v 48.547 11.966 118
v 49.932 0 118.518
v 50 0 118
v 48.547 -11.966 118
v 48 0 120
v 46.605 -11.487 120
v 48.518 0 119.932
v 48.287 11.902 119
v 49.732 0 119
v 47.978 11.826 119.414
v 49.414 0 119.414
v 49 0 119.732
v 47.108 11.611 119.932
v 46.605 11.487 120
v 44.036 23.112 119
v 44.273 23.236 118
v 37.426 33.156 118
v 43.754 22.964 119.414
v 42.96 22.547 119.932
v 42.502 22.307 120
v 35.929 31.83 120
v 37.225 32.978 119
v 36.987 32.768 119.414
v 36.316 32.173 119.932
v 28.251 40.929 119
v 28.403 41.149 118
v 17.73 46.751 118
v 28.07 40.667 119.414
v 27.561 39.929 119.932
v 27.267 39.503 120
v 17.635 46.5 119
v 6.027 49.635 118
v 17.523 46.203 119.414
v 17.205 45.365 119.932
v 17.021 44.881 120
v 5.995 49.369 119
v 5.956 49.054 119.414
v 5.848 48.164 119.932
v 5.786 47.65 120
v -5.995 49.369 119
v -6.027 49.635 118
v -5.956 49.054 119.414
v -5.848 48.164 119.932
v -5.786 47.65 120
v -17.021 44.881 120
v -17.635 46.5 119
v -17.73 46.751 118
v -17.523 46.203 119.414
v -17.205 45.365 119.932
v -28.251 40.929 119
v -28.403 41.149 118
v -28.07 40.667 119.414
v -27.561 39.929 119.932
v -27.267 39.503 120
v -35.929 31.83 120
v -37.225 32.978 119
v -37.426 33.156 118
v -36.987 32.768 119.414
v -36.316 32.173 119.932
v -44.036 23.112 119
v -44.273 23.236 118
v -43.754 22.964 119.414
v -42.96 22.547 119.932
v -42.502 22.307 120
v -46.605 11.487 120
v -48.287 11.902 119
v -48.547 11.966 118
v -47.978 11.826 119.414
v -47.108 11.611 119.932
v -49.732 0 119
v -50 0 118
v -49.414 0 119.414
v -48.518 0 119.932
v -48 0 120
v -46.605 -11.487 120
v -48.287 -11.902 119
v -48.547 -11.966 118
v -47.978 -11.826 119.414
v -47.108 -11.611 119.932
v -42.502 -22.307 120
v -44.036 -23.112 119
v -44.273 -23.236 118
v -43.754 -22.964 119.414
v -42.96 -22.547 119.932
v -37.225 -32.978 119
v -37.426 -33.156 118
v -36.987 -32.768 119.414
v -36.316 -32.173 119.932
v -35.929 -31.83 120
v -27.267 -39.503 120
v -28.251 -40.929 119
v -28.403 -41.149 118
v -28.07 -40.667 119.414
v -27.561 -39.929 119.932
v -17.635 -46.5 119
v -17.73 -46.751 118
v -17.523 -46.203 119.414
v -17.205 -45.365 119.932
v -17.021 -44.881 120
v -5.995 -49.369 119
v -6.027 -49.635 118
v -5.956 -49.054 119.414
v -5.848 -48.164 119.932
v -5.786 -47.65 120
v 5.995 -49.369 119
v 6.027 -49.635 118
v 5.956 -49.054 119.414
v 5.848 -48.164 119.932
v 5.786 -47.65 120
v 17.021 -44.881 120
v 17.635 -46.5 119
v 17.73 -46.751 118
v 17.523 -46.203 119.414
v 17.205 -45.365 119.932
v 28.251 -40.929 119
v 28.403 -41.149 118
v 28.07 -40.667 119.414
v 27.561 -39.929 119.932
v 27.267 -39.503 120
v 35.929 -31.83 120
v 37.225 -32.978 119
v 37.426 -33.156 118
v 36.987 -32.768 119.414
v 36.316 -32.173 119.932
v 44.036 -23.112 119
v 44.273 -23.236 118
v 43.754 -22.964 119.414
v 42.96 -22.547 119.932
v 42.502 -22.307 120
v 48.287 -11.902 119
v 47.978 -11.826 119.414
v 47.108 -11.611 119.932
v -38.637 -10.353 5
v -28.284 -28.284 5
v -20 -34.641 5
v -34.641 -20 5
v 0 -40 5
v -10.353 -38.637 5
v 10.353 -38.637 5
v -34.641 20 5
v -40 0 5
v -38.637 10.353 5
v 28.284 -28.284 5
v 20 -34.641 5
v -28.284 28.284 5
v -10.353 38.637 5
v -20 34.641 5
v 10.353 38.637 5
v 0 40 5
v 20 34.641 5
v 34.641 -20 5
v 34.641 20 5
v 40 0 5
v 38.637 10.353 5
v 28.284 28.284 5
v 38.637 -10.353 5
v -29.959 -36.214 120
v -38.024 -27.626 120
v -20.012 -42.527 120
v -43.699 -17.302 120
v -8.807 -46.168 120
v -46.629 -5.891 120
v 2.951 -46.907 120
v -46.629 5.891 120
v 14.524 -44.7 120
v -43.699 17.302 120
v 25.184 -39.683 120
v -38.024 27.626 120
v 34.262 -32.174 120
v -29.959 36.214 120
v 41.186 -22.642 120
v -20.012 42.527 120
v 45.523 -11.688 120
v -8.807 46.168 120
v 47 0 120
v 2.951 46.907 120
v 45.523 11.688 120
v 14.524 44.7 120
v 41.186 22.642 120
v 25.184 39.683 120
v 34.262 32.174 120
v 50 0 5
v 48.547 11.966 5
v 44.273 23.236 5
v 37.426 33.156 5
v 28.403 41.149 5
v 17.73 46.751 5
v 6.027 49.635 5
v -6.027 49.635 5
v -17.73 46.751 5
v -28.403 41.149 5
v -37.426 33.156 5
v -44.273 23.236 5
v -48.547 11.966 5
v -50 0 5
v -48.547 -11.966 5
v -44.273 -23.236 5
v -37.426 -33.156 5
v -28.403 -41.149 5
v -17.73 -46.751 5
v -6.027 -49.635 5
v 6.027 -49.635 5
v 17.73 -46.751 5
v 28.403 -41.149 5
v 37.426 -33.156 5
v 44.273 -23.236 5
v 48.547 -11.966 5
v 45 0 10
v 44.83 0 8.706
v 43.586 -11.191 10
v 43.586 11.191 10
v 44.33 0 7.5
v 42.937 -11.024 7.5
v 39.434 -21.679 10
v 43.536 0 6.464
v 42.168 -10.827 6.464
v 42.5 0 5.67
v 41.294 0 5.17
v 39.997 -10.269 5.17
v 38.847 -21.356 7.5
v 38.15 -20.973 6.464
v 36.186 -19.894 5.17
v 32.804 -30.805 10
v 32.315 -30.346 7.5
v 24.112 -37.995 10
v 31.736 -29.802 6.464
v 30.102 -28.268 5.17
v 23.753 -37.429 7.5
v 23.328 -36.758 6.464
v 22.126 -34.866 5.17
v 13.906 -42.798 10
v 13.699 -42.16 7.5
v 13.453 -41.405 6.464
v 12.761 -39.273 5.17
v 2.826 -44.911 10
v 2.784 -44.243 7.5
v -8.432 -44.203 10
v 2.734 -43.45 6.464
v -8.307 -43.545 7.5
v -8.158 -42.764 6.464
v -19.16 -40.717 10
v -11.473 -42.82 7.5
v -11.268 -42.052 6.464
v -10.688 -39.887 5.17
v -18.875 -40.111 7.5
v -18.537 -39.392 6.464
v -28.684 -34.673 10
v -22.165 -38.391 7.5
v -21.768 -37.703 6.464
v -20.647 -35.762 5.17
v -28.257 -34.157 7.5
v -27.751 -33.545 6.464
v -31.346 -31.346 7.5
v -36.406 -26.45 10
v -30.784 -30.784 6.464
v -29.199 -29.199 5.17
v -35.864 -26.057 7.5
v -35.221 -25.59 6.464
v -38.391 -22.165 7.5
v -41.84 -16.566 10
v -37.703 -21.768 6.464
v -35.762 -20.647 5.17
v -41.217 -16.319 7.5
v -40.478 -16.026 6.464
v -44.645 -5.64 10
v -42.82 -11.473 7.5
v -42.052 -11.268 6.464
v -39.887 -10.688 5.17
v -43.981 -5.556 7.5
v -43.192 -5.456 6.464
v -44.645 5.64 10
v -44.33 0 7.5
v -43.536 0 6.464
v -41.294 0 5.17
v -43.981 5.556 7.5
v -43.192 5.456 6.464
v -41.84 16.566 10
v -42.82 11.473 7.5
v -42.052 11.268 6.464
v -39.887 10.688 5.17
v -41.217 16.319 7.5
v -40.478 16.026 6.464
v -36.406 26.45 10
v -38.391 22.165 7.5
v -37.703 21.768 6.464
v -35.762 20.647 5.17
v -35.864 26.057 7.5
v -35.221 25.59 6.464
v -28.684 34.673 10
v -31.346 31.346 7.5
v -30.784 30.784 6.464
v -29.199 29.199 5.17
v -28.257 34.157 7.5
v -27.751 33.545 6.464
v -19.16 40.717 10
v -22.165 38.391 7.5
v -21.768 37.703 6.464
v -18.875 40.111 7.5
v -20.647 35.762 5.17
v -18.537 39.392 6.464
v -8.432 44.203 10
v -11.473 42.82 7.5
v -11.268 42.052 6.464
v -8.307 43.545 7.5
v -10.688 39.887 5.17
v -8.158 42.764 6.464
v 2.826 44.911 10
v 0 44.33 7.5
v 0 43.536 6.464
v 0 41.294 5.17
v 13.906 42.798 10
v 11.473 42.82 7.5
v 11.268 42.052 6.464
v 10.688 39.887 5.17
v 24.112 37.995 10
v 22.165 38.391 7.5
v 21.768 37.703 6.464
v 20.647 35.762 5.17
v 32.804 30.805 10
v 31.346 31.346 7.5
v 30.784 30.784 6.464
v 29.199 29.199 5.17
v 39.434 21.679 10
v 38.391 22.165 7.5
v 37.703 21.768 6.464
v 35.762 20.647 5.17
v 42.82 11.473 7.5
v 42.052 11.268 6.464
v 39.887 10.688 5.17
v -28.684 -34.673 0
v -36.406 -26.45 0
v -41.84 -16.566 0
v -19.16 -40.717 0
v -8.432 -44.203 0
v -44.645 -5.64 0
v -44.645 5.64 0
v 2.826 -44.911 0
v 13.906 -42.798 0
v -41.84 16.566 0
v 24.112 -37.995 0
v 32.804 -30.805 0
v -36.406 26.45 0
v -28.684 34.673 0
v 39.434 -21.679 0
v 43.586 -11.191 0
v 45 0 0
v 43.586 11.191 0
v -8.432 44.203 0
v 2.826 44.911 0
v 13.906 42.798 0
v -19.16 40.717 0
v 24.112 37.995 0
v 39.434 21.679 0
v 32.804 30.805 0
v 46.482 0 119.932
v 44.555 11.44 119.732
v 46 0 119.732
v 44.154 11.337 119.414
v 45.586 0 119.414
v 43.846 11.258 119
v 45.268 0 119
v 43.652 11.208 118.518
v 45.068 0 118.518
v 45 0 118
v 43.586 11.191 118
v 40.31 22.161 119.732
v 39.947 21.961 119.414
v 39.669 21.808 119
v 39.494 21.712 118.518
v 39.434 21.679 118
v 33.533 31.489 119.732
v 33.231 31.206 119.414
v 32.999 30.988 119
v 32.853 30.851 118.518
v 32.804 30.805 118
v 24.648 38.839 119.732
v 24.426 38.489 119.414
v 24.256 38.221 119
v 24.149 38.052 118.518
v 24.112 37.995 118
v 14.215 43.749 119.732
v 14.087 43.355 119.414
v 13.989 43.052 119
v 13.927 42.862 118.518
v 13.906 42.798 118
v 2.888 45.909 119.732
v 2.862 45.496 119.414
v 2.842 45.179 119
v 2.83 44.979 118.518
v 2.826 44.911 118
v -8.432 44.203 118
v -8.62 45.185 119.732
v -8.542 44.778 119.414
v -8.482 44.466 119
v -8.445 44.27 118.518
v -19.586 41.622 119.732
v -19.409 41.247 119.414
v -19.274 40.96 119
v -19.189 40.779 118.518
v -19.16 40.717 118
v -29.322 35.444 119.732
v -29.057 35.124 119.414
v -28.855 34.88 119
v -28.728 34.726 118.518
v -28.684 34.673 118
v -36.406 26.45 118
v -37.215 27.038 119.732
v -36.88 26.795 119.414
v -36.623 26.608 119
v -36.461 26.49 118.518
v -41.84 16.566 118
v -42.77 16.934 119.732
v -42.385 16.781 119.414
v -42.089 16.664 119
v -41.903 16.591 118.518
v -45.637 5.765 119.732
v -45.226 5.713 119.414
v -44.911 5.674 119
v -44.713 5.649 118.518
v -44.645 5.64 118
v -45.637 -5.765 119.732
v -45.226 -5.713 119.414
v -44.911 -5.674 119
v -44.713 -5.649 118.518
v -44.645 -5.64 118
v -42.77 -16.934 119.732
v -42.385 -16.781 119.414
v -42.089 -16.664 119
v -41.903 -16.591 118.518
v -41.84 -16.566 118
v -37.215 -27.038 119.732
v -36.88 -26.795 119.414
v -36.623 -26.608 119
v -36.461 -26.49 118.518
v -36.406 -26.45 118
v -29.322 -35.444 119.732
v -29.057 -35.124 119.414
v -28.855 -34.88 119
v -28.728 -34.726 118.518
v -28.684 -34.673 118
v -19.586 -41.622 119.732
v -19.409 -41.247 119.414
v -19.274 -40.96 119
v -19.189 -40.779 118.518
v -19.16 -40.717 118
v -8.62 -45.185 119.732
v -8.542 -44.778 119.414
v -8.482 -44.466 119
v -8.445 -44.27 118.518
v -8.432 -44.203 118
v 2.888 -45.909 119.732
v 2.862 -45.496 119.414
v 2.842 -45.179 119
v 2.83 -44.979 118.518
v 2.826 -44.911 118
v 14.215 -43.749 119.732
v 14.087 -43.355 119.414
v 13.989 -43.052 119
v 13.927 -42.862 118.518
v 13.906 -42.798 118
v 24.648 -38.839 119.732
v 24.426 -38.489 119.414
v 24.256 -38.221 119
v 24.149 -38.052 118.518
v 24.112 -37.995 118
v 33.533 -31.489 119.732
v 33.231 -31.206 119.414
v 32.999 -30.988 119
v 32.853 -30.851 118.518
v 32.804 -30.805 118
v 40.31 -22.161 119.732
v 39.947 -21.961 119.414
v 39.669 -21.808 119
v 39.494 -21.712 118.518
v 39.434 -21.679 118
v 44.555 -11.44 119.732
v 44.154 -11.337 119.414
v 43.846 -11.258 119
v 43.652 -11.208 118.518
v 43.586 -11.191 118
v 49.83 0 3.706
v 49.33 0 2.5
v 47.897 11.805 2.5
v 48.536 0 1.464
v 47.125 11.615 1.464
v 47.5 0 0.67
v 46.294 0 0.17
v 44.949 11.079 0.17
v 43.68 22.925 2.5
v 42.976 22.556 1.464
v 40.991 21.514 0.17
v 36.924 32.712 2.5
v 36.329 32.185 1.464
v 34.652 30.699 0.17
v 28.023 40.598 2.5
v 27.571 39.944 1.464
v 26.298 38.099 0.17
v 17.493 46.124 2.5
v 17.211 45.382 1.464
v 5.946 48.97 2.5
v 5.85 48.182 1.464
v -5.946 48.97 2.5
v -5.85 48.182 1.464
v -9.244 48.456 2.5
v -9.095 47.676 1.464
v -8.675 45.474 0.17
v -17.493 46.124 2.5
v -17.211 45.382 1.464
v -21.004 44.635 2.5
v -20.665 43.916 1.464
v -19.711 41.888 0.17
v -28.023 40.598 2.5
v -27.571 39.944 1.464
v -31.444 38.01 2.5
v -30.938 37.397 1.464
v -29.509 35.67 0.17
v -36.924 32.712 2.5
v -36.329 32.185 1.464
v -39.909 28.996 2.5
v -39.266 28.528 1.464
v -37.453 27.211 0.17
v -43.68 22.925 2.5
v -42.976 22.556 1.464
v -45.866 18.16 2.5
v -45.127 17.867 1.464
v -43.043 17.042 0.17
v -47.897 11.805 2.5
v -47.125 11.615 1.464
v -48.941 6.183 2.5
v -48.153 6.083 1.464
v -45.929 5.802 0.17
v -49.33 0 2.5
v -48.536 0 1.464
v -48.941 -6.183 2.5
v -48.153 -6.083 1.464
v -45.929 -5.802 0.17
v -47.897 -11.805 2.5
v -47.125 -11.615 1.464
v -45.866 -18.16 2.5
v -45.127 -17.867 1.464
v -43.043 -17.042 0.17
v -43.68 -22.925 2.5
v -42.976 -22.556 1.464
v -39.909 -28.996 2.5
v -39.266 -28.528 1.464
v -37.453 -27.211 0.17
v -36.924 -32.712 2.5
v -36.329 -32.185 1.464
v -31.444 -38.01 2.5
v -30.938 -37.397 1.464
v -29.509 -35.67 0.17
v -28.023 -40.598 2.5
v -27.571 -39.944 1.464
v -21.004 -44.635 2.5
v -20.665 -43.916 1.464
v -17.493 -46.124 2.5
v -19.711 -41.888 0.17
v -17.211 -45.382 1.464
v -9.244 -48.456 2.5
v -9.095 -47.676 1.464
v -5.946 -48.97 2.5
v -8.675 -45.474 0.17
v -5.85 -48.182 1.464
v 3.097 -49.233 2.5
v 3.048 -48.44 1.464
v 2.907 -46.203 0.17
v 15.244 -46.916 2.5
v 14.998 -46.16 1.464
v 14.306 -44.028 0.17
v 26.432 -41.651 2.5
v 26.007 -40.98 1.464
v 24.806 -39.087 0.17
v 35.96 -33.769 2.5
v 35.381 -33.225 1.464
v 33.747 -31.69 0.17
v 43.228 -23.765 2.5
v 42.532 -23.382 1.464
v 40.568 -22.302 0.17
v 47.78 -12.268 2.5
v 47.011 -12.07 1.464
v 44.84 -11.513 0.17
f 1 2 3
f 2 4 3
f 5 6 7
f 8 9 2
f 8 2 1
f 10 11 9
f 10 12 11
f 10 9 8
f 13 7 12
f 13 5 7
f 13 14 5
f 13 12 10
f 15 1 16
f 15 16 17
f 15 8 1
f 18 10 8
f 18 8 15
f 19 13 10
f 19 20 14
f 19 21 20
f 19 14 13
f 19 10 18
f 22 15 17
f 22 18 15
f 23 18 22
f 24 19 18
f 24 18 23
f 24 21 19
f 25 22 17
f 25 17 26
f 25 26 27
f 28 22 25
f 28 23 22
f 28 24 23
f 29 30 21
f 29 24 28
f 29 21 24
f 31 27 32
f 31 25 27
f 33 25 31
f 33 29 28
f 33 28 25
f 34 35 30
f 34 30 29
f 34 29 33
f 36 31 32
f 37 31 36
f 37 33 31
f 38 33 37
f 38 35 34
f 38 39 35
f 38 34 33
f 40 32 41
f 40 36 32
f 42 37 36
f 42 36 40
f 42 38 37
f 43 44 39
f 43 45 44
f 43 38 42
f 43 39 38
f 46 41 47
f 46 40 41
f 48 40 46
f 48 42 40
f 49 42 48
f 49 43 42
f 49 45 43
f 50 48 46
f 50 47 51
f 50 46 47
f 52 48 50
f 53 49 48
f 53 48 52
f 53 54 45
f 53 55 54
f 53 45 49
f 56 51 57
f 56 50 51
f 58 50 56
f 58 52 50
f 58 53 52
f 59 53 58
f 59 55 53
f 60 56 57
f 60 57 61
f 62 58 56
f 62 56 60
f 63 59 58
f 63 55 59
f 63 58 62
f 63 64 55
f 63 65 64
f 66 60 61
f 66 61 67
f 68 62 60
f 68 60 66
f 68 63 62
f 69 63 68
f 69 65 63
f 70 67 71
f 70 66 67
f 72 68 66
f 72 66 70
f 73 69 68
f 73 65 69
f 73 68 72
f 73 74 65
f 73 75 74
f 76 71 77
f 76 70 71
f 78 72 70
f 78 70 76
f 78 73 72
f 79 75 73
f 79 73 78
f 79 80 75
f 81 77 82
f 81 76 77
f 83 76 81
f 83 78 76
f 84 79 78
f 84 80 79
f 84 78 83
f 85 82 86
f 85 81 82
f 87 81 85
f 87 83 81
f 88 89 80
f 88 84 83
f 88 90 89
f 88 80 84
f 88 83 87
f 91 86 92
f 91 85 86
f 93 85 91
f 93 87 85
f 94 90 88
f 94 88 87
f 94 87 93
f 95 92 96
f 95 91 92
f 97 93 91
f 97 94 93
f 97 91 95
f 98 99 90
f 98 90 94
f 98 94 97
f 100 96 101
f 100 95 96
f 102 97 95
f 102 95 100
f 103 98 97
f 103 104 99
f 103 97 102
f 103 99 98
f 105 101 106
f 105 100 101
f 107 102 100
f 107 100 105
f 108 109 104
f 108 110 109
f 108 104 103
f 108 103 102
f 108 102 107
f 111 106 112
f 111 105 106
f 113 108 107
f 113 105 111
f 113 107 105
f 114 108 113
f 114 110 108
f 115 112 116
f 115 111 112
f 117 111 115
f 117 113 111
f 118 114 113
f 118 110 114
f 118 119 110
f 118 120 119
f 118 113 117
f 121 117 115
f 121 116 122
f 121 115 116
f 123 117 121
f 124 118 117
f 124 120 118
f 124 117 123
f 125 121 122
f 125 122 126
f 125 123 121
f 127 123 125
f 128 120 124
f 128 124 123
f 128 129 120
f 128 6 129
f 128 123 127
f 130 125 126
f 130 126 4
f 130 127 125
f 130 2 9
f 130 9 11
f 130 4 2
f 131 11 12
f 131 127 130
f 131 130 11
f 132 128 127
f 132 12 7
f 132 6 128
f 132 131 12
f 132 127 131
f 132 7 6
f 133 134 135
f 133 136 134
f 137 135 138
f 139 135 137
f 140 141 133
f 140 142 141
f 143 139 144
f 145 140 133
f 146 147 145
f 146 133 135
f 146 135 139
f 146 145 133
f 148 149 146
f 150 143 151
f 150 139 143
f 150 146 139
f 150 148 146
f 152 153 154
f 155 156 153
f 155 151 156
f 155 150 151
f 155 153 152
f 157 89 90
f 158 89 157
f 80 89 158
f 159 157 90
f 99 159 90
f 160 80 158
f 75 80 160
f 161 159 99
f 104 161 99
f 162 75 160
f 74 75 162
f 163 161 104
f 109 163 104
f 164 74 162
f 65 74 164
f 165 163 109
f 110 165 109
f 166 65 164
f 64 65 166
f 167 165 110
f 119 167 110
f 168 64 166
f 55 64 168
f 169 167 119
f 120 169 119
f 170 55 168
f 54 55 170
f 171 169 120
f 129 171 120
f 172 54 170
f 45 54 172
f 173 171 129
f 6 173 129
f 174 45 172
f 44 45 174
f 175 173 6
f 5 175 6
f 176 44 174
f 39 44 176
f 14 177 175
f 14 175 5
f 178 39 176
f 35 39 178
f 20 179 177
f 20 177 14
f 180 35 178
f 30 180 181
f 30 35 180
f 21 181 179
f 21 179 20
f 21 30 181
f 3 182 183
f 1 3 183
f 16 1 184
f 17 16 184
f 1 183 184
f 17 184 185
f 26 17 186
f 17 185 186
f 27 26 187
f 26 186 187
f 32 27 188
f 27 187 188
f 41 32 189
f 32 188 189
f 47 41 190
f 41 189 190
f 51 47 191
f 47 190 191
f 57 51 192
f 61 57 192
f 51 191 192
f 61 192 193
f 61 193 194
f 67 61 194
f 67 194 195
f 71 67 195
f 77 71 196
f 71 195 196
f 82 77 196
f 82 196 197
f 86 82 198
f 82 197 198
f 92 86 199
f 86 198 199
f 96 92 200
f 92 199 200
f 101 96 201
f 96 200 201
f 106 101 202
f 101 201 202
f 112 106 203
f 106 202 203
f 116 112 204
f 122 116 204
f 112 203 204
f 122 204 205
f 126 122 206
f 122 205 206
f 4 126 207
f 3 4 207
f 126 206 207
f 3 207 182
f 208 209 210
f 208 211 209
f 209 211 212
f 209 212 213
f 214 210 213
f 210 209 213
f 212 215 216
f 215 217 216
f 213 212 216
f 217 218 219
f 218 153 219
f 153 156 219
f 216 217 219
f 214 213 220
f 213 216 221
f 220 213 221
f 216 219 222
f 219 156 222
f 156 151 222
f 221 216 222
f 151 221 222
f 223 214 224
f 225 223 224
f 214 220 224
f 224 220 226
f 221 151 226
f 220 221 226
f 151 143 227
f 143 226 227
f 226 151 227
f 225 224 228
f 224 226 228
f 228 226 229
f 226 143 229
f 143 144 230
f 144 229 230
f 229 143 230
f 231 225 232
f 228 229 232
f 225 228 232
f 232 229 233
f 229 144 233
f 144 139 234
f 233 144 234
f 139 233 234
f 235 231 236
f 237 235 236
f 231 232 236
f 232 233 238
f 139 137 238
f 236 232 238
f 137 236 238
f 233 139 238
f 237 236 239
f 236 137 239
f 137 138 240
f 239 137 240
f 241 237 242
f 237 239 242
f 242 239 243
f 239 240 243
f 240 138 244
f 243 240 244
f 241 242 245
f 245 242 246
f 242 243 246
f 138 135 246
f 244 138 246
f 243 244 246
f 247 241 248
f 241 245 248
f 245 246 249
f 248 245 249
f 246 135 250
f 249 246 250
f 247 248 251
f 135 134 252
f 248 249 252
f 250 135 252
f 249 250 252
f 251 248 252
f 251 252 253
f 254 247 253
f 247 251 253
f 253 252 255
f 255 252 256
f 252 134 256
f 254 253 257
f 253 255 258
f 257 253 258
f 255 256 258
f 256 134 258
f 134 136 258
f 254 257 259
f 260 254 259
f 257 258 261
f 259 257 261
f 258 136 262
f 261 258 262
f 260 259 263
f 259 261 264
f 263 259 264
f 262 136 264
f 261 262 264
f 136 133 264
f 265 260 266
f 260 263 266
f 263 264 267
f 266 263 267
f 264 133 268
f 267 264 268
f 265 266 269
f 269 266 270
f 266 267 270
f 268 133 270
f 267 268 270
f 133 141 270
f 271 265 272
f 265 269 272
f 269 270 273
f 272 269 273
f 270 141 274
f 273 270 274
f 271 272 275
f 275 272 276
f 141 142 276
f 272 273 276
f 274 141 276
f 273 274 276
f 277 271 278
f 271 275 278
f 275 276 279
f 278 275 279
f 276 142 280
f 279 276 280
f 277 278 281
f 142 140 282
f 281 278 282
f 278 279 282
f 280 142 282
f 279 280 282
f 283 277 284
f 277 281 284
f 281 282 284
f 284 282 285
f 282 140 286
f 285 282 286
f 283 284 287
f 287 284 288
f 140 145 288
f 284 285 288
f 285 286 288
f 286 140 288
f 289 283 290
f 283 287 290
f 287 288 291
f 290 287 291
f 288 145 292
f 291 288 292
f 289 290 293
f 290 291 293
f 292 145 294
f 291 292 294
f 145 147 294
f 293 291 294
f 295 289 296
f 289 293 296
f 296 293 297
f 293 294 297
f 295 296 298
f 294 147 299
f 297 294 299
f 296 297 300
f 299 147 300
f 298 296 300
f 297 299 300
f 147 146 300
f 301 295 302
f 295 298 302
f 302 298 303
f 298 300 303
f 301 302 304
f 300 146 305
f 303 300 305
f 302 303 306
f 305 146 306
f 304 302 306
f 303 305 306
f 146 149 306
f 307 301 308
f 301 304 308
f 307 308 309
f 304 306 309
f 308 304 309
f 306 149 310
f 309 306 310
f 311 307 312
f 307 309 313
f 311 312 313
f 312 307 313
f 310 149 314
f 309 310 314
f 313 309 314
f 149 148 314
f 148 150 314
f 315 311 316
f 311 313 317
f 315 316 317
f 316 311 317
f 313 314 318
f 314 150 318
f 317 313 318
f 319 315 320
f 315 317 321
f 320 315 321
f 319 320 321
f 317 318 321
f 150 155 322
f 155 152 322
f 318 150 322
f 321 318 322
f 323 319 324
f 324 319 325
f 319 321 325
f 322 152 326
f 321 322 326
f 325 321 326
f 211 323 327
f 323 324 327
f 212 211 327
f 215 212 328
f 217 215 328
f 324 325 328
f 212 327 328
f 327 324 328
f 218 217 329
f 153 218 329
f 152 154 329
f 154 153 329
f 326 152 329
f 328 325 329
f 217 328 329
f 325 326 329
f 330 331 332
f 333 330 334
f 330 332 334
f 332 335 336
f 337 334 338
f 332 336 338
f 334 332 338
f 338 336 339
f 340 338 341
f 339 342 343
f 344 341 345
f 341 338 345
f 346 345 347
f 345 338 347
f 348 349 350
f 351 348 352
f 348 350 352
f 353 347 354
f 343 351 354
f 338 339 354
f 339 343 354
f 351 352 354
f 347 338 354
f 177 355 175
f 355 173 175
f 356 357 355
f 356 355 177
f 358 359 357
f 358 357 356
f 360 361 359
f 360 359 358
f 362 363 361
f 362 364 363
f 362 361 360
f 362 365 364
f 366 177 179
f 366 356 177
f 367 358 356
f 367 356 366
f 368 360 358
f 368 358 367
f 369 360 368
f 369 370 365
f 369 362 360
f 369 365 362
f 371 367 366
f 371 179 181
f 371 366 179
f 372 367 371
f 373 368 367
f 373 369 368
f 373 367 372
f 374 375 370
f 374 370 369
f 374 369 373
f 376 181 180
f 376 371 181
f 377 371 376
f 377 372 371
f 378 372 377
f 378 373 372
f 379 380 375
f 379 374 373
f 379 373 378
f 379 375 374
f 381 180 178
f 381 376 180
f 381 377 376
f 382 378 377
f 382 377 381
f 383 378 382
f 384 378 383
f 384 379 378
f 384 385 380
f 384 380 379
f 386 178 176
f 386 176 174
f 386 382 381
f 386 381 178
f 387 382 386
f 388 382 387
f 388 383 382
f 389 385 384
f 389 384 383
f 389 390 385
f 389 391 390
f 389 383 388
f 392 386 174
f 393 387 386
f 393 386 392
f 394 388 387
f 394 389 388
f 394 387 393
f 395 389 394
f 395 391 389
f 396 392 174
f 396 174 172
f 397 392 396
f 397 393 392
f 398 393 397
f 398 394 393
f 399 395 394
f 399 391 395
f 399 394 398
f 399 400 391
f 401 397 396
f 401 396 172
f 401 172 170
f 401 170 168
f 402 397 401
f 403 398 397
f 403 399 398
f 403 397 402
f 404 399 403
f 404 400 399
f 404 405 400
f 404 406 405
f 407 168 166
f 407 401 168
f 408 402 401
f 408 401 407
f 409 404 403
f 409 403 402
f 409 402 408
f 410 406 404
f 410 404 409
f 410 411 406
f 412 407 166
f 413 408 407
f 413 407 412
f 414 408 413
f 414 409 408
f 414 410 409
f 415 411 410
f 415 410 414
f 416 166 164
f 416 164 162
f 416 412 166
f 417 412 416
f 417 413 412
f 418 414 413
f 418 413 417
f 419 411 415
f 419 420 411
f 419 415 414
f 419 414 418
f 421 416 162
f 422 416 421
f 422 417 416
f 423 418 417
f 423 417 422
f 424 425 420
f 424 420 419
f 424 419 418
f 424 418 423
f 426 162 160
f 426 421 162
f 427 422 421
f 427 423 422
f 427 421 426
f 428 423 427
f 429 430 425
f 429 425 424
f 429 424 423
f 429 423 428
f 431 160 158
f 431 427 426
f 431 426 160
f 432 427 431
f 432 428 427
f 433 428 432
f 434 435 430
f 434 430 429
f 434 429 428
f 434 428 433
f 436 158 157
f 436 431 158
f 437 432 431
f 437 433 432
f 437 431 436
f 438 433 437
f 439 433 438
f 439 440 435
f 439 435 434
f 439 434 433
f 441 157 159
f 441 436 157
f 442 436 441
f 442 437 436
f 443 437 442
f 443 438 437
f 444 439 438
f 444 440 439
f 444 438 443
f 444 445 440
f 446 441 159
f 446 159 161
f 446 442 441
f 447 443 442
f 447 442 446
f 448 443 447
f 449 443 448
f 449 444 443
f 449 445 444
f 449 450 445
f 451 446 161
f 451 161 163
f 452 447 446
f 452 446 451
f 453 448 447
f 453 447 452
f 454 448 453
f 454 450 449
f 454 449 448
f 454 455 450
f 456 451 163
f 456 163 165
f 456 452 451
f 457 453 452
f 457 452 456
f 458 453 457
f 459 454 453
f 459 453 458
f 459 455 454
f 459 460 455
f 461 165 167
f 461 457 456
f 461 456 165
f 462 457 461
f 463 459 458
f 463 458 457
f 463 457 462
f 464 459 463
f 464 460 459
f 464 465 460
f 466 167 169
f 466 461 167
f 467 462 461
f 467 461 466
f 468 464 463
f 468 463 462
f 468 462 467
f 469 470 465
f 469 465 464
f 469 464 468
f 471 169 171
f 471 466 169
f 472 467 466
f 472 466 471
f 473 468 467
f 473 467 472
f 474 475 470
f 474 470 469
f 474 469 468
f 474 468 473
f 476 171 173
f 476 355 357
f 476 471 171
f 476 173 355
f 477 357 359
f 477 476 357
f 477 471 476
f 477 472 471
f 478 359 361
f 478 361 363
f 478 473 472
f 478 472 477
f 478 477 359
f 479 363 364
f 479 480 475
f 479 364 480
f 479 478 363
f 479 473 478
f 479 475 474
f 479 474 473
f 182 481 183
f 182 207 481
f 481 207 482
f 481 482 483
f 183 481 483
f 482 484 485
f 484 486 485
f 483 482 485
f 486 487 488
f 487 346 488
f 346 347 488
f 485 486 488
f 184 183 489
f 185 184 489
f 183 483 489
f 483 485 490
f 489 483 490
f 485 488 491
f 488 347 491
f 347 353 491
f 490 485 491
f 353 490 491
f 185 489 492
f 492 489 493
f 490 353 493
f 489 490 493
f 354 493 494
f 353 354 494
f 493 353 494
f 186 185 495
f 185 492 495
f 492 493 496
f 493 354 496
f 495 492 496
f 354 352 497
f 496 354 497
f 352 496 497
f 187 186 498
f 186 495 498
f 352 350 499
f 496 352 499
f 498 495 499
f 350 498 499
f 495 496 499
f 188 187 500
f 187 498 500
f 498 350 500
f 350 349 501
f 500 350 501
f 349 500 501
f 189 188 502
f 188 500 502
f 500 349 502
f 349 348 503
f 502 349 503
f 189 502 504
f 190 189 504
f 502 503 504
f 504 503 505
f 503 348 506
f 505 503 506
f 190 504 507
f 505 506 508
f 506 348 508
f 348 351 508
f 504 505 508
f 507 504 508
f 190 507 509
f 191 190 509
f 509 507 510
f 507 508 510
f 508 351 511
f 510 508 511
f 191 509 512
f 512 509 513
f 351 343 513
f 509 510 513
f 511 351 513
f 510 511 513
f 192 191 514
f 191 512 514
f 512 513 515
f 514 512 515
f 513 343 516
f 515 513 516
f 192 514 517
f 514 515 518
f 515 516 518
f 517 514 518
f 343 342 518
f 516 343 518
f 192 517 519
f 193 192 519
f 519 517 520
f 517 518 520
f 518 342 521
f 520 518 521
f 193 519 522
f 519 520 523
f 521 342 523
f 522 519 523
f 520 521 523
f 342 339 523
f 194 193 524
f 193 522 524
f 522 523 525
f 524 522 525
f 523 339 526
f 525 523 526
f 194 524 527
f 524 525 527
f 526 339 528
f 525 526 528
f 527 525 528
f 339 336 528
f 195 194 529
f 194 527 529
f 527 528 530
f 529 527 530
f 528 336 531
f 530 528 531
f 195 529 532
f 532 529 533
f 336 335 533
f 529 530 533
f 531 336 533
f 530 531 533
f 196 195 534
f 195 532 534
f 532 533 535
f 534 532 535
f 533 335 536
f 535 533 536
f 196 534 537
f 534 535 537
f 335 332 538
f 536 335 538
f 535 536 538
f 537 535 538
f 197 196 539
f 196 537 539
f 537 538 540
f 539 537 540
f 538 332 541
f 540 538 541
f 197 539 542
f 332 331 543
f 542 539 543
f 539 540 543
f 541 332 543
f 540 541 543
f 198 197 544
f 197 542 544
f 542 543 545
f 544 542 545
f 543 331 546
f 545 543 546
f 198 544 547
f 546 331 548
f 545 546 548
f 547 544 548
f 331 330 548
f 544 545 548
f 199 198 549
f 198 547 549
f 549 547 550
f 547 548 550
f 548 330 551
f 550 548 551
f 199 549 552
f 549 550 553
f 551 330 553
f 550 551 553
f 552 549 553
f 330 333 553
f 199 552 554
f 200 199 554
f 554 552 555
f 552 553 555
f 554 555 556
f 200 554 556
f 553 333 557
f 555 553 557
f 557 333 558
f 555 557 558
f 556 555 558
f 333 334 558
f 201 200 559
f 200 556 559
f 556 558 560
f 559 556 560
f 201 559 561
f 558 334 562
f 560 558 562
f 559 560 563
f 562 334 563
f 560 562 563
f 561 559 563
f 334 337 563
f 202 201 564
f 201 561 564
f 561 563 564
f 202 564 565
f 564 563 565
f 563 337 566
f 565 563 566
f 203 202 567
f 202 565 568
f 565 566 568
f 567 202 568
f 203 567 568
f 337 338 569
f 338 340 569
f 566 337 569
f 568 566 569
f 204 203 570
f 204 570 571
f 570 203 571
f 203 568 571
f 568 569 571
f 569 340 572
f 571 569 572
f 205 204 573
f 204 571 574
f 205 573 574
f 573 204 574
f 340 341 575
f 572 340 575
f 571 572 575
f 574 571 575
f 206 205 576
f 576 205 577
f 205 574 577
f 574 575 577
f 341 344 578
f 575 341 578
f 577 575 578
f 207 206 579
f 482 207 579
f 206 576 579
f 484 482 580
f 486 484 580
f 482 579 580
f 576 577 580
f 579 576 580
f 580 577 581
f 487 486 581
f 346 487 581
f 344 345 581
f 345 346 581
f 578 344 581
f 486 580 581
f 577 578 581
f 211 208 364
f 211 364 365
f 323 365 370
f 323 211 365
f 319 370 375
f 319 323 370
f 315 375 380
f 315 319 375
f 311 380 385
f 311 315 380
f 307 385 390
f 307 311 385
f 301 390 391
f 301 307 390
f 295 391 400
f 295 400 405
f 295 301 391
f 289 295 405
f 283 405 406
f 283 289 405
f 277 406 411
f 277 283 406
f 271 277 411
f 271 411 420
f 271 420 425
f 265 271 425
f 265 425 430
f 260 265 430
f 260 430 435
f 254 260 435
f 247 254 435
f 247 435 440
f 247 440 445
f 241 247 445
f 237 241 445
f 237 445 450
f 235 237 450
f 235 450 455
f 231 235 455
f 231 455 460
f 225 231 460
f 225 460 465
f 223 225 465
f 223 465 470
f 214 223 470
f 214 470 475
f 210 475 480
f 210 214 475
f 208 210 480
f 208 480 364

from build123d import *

# Parameters (mm, degrees)
F0_R     = 50
F1_DEPTH = 120
F2_T     = -5
F3_R     = 5
F4_R     = 2


with BuildPart() as f1:
    # F0 (on Top) → F1 (new body)
    with BuildSketch(Plane.XY):
        Circle(F0_R)
    extrude(amount=F1_DEPTH)

    # F2
    f2_openings = [f1.faces().sort_by_distance(p)[0] for p in [
        (0, 0, 120),
    ]]
    offset(amount=F2_T, openings=f2_openings)

    # F3
    f3_edges = [f1.edges().sort_by_distance(p)[0] for p in [
        (-45, 0, 5),
        (-50, 0, 0),
    ]]
    fillet(f3_edges, radius=F3_R)

    # F4
    f4_edges = [f1.edges().sort_by_distance(p)[0] for p in [
        (-45, 0, 120),
        (-50, 0, 120),
    ]]
    fillet(f4_edges, radius=F4_R)


solid = f1.part
